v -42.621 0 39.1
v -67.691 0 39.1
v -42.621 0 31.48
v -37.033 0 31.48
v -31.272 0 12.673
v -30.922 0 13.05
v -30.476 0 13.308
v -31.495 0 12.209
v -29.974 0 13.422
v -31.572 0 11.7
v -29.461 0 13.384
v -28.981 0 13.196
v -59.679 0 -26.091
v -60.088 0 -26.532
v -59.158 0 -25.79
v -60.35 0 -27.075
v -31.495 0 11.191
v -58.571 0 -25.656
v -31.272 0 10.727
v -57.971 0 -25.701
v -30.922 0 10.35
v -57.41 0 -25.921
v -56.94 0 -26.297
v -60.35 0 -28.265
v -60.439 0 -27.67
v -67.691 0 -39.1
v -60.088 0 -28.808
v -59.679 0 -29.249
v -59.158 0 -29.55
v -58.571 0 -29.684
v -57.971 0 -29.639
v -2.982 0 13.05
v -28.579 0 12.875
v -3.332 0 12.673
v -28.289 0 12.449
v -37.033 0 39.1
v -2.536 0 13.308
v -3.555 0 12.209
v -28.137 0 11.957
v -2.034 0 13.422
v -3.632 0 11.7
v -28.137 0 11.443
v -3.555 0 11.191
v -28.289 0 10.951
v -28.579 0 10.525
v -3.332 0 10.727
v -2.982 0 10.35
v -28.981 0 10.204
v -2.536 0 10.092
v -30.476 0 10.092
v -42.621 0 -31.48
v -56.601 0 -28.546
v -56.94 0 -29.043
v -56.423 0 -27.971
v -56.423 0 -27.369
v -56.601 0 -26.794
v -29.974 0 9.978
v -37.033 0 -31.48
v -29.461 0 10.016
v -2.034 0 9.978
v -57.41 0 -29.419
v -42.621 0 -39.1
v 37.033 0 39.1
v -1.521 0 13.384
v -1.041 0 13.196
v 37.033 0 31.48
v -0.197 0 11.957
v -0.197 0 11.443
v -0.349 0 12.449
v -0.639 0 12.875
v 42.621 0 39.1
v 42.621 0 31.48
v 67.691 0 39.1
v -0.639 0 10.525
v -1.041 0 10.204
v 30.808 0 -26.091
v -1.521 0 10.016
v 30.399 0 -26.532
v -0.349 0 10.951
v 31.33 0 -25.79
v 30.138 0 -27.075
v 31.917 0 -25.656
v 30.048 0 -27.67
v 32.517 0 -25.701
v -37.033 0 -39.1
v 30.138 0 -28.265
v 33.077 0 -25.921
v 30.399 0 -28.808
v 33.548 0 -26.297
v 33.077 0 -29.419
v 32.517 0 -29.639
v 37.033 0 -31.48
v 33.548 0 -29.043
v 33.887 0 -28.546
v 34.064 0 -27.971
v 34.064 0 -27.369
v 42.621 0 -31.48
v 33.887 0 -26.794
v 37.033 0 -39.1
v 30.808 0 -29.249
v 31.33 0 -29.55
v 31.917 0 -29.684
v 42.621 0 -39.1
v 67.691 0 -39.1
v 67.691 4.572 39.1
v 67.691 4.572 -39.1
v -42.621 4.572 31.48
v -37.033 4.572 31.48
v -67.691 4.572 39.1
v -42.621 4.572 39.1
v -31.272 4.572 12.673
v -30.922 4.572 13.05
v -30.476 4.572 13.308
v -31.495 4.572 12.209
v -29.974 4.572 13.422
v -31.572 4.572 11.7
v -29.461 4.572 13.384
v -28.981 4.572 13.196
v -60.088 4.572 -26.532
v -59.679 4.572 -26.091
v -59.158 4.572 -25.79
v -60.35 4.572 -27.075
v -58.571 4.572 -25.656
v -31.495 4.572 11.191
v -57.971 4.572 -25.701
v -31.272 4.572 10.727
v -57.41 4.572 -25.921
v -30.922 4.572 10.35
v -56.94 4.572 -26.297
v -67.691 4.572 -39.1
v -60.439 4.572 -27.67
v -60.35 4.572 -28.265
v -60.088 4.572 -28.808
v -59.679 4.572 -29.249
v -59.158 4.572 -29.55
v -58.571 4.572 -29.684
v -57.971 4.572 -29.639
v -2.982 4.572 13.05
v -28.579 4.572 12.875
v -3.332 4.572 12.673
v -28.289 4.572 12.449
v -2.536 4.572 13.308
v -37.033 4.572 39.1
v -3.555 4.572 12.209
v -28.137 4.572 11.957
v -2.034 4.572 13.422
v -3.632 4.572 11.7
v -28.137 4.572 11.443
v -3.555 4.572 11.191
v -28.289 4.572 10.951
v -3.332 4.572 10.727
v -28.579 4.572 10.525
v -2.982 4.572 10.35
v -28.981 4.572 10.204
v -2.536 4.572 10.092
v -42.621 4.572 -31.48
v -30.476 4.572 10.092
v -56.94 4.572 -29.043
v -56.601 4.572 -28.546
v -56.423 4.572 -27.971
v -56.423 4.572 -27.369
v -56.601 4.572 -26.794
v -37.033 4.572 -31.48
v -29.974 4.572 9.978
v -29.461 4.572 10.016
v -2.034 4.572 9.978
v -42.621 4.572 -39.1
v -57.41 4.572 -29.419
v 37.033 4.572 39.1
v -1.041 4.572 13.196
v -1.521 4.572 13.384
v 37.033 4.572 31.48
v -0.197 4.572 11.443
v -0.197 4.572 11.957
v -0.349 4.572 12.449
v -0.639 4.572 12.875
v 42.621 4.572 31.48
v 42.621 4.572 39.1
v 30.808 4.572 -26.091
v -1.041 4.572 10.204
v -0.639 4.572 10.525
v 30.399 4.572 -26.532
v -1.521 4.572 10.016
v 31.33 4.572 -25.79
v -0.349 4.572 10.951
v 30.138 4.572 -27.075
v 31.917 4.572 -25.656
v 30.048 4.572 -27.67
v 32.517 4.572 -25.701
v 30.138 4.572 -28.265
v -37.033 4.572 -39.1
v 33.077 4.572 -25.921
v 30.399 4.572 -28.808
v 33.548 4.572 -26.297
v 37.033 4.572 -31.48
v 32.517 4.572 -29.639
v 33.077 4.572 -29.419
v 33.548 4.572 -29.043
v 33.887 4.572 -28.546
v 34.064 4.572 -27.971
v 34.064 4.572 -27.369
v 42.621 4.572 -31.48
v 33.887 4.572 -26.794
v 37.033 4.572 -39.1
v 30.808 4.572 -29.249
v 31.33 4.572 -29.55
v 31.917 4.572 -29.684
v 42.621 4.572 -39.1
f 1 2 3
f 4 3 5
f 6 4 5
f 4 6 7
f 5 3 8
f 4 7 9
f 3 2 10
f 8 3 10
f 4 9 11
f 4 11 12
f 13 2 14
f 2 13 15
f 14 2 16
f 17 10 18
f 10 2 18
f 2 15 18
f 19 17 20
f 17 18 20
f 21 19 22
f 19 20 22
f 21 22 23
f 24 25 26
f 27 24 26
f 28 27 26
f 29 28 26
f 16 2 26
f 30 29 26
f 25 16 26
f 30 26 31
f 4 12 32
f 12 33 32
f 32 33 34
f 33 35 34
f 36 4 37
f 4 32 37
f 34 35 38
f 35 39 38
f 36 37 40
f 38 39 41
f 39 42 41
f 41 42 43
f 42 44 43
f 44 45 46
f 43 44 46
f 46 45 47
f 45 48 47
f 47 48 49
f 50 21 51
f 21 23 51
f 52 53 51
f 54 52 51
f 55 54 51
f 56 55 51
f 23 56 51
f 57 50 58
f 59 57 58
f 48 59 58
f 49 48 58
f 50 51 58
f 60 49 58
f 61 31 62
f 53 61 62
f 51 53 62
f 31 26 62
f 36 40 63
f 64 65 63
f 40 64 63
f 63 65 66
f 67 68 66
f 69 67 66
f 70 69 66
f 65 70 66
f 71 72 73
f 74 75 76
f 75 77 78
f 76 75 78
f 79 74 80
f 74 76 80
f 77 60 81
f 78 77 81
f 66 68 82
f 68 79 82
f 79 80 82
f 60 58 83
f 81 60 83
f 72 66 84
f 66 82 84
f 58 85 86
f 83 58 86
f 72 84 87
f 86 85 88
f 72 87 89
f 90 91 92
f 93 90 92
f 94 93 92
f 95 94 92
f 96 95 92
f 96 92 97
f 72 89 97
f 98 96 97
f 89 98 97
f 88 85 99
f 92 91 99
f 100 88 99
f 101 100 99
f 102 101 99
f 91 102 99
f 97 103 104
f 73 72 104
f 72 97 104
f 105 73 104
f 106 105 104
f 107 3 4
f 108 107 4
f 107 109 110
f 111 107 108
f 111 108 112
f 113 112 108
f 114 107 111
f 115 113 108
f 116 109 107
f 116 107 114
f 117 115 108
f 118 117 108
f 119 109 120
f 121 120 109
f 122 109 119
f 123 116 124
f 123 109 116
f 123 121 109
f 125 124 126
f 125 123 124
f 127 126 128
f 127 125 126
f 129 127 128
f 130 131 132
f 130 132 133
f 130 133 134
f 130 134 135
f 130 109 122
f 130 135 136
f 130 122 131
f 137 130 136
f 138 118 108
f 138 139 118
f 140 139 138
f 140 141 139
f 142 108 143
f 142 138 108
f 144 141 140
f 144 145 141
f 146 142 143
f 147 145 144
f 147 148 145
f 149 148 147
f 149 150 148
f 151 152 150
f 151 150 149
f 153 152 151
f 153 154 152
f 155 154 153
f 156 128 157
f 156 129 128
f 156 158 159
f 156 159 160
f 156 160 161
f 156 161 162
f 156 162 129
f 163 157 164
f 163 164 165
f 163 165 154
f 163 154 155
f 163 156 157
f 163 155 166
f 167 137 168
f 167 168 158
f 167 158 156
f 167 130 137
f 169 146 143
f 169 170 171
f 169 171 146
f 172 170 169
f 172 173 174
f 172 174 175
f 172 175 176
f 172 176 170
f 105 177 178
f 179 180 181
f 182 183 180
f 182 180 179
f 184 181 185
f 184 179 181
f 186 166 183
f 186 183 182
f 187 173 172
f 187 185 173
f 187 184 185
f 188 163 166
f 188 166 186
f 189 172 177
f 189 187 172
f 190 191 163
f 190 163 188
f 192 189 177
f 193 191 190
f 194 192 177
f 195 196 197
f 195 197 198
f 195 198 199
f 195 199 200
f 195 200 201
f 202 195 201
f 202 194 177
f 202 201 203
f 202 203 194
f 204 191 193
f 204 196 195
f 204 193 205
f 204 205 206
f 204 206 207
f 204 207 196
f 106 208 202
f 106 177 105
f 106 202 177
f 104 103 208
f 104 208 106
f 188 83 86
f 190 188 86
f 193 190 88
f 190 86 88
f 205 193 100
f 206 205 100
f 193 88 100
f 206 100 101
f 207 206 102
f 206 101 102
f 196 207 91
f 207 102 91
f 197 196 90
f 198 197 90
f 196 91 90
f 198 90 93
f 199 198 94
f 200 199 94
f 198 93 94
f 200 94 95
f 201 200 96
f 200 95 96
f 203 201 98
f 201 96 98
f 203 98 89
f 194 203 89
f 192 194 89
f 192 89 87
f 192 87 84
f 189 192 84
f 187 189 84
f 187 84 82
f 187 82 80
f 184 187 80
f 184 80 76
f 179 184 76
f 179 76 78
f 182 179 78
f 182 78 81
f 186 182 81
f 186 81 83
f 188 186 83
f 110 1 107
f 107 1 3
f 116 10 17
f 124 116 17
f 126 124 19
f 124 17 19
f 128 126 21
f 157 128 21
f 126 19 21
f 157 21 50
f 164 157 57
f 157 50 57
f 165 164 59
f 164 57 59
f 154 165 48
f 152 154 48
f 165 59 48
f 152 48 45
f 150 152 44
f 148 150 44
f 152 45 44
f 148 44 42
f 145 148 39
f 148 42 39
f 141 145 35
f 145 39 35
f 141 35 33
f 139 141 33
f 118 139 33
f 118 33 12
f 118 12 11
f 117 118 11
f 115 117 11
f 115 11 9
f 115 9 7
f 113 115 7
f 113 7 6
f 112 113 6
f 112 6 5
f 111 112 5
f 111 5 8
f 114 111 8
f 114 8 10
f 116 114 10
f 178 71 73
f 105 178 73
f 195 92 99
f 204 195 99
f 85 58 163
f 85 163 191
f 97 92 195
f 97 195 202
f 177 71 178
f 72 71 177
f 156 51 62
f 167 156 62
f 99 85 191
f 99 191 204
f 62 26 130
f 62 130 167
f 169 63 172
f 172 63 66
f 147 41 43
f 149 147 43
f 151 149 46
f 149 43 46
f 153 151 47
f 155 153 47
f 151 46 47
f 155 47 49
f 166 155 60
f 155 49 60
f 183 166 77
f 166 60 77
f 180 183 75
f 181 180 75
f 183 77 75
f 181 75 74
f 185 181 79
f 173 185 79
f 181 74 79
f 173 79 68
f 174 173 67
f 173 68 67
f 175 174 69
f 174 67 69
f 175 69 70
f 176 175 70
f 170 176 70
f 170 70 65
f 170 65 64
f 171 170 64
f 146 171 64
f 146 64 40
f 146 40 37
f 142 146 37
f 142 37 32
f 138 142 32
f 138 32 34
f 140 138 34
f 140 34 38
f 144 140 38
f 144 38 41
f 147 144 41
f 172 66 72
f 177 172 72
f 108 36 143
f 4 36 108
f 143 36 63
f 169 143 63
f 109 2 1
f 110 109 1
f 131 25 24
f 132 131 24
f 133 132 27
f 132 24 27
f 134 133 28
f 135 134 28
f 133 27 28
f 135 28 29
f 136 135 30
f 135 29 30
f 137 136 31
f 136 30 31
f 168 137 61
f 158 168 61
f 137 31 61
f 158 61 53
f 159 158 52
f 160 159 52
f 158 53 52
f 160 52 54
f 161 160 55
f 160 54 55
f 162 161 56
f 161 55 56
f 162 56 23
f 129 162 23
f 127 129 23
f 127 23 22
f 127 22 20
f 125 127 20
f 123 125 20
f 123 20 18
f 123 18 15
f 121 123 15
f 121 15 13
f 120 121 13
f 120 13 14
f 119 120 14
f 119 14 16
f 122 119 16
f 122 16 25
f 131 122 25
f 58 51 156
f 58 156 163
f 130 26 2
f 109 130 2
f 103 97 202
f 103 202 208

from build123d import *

# Parameters (mm, degrees)
SKETCH1_W              = 135.382
SKETCH1_H              = 62.96
SKETCH1_W_2            = 25.0698
SKETCH1_H_2            = 7.62
SKETCH1_W_3            = 74.0664
BOSS_EXTRUDE1_DEPTH    = 4.572
F_10_32_TAPPED_HOLE1_D = 4.0386
F_8_32_TAPPED_HOLE1_D  = 3.4544


with BuildPart() as part:
    # Sketch1 → Boss-Extrude1 (new body)
    with BuildSketch(Plane(origin=(0, 0, 0), x_dir=(1, 0, 0), z_dir=(0, 1, 0))):
        Rectangle(SKETCH1_W, SKETCH1_H)
        with Locations((55.1561, 35.29)):
            Rectangle(SKETCH1_W_2, SKETCH1_H_2)
        with Locations((0, 35.29)):
            Rectangle(SKETCH1_W_3, SKETCH1_H_2)
        with Locations((-55.1561, 35.29)):
            Rectangle(SKETCH1_W_2, SKETCH1_H_2)
        with Locations((-55.1561, -35.29)):
            Rectangle(SKETCH1_W_2, SKETCH1_H_2)
        with Locations((0, -35.29)):
            Rectangle(SKETCH1_W_3, SKETCH1_H_2)
        with Locations((55.1561, -35.29)):
            Rectangle(SKETCH1_W_2, SKETCH1_H_2)
    extrude(amount=BOSS_EXTRUDE1_DEPTH)

    # #10-32 Tapped Hole1 (through all)
    with Locations(Plane(origin=(0, 4.572, 0), x_dir=(1, 0, 0), z_dir=(0, 1, 0))):
        with Locations((-58.42, 27.67), (32.0675, 27.67)):
            Hole(F_10_32_TAPPED_HOLE1_D / 2)

    # #8-32 Tapped Hole1 (through all)
    with Locations(Plane(origin=(0, 4.572, 0), x_dir=(1, 0, 0), z_dir=(0, 1, 0))):
        with Locations((-29.845, -11.7), (-1.905, -11.7)):
            Hole(F_8_32_TAPPED_HOLE1_D / 2)


solid = part.part
